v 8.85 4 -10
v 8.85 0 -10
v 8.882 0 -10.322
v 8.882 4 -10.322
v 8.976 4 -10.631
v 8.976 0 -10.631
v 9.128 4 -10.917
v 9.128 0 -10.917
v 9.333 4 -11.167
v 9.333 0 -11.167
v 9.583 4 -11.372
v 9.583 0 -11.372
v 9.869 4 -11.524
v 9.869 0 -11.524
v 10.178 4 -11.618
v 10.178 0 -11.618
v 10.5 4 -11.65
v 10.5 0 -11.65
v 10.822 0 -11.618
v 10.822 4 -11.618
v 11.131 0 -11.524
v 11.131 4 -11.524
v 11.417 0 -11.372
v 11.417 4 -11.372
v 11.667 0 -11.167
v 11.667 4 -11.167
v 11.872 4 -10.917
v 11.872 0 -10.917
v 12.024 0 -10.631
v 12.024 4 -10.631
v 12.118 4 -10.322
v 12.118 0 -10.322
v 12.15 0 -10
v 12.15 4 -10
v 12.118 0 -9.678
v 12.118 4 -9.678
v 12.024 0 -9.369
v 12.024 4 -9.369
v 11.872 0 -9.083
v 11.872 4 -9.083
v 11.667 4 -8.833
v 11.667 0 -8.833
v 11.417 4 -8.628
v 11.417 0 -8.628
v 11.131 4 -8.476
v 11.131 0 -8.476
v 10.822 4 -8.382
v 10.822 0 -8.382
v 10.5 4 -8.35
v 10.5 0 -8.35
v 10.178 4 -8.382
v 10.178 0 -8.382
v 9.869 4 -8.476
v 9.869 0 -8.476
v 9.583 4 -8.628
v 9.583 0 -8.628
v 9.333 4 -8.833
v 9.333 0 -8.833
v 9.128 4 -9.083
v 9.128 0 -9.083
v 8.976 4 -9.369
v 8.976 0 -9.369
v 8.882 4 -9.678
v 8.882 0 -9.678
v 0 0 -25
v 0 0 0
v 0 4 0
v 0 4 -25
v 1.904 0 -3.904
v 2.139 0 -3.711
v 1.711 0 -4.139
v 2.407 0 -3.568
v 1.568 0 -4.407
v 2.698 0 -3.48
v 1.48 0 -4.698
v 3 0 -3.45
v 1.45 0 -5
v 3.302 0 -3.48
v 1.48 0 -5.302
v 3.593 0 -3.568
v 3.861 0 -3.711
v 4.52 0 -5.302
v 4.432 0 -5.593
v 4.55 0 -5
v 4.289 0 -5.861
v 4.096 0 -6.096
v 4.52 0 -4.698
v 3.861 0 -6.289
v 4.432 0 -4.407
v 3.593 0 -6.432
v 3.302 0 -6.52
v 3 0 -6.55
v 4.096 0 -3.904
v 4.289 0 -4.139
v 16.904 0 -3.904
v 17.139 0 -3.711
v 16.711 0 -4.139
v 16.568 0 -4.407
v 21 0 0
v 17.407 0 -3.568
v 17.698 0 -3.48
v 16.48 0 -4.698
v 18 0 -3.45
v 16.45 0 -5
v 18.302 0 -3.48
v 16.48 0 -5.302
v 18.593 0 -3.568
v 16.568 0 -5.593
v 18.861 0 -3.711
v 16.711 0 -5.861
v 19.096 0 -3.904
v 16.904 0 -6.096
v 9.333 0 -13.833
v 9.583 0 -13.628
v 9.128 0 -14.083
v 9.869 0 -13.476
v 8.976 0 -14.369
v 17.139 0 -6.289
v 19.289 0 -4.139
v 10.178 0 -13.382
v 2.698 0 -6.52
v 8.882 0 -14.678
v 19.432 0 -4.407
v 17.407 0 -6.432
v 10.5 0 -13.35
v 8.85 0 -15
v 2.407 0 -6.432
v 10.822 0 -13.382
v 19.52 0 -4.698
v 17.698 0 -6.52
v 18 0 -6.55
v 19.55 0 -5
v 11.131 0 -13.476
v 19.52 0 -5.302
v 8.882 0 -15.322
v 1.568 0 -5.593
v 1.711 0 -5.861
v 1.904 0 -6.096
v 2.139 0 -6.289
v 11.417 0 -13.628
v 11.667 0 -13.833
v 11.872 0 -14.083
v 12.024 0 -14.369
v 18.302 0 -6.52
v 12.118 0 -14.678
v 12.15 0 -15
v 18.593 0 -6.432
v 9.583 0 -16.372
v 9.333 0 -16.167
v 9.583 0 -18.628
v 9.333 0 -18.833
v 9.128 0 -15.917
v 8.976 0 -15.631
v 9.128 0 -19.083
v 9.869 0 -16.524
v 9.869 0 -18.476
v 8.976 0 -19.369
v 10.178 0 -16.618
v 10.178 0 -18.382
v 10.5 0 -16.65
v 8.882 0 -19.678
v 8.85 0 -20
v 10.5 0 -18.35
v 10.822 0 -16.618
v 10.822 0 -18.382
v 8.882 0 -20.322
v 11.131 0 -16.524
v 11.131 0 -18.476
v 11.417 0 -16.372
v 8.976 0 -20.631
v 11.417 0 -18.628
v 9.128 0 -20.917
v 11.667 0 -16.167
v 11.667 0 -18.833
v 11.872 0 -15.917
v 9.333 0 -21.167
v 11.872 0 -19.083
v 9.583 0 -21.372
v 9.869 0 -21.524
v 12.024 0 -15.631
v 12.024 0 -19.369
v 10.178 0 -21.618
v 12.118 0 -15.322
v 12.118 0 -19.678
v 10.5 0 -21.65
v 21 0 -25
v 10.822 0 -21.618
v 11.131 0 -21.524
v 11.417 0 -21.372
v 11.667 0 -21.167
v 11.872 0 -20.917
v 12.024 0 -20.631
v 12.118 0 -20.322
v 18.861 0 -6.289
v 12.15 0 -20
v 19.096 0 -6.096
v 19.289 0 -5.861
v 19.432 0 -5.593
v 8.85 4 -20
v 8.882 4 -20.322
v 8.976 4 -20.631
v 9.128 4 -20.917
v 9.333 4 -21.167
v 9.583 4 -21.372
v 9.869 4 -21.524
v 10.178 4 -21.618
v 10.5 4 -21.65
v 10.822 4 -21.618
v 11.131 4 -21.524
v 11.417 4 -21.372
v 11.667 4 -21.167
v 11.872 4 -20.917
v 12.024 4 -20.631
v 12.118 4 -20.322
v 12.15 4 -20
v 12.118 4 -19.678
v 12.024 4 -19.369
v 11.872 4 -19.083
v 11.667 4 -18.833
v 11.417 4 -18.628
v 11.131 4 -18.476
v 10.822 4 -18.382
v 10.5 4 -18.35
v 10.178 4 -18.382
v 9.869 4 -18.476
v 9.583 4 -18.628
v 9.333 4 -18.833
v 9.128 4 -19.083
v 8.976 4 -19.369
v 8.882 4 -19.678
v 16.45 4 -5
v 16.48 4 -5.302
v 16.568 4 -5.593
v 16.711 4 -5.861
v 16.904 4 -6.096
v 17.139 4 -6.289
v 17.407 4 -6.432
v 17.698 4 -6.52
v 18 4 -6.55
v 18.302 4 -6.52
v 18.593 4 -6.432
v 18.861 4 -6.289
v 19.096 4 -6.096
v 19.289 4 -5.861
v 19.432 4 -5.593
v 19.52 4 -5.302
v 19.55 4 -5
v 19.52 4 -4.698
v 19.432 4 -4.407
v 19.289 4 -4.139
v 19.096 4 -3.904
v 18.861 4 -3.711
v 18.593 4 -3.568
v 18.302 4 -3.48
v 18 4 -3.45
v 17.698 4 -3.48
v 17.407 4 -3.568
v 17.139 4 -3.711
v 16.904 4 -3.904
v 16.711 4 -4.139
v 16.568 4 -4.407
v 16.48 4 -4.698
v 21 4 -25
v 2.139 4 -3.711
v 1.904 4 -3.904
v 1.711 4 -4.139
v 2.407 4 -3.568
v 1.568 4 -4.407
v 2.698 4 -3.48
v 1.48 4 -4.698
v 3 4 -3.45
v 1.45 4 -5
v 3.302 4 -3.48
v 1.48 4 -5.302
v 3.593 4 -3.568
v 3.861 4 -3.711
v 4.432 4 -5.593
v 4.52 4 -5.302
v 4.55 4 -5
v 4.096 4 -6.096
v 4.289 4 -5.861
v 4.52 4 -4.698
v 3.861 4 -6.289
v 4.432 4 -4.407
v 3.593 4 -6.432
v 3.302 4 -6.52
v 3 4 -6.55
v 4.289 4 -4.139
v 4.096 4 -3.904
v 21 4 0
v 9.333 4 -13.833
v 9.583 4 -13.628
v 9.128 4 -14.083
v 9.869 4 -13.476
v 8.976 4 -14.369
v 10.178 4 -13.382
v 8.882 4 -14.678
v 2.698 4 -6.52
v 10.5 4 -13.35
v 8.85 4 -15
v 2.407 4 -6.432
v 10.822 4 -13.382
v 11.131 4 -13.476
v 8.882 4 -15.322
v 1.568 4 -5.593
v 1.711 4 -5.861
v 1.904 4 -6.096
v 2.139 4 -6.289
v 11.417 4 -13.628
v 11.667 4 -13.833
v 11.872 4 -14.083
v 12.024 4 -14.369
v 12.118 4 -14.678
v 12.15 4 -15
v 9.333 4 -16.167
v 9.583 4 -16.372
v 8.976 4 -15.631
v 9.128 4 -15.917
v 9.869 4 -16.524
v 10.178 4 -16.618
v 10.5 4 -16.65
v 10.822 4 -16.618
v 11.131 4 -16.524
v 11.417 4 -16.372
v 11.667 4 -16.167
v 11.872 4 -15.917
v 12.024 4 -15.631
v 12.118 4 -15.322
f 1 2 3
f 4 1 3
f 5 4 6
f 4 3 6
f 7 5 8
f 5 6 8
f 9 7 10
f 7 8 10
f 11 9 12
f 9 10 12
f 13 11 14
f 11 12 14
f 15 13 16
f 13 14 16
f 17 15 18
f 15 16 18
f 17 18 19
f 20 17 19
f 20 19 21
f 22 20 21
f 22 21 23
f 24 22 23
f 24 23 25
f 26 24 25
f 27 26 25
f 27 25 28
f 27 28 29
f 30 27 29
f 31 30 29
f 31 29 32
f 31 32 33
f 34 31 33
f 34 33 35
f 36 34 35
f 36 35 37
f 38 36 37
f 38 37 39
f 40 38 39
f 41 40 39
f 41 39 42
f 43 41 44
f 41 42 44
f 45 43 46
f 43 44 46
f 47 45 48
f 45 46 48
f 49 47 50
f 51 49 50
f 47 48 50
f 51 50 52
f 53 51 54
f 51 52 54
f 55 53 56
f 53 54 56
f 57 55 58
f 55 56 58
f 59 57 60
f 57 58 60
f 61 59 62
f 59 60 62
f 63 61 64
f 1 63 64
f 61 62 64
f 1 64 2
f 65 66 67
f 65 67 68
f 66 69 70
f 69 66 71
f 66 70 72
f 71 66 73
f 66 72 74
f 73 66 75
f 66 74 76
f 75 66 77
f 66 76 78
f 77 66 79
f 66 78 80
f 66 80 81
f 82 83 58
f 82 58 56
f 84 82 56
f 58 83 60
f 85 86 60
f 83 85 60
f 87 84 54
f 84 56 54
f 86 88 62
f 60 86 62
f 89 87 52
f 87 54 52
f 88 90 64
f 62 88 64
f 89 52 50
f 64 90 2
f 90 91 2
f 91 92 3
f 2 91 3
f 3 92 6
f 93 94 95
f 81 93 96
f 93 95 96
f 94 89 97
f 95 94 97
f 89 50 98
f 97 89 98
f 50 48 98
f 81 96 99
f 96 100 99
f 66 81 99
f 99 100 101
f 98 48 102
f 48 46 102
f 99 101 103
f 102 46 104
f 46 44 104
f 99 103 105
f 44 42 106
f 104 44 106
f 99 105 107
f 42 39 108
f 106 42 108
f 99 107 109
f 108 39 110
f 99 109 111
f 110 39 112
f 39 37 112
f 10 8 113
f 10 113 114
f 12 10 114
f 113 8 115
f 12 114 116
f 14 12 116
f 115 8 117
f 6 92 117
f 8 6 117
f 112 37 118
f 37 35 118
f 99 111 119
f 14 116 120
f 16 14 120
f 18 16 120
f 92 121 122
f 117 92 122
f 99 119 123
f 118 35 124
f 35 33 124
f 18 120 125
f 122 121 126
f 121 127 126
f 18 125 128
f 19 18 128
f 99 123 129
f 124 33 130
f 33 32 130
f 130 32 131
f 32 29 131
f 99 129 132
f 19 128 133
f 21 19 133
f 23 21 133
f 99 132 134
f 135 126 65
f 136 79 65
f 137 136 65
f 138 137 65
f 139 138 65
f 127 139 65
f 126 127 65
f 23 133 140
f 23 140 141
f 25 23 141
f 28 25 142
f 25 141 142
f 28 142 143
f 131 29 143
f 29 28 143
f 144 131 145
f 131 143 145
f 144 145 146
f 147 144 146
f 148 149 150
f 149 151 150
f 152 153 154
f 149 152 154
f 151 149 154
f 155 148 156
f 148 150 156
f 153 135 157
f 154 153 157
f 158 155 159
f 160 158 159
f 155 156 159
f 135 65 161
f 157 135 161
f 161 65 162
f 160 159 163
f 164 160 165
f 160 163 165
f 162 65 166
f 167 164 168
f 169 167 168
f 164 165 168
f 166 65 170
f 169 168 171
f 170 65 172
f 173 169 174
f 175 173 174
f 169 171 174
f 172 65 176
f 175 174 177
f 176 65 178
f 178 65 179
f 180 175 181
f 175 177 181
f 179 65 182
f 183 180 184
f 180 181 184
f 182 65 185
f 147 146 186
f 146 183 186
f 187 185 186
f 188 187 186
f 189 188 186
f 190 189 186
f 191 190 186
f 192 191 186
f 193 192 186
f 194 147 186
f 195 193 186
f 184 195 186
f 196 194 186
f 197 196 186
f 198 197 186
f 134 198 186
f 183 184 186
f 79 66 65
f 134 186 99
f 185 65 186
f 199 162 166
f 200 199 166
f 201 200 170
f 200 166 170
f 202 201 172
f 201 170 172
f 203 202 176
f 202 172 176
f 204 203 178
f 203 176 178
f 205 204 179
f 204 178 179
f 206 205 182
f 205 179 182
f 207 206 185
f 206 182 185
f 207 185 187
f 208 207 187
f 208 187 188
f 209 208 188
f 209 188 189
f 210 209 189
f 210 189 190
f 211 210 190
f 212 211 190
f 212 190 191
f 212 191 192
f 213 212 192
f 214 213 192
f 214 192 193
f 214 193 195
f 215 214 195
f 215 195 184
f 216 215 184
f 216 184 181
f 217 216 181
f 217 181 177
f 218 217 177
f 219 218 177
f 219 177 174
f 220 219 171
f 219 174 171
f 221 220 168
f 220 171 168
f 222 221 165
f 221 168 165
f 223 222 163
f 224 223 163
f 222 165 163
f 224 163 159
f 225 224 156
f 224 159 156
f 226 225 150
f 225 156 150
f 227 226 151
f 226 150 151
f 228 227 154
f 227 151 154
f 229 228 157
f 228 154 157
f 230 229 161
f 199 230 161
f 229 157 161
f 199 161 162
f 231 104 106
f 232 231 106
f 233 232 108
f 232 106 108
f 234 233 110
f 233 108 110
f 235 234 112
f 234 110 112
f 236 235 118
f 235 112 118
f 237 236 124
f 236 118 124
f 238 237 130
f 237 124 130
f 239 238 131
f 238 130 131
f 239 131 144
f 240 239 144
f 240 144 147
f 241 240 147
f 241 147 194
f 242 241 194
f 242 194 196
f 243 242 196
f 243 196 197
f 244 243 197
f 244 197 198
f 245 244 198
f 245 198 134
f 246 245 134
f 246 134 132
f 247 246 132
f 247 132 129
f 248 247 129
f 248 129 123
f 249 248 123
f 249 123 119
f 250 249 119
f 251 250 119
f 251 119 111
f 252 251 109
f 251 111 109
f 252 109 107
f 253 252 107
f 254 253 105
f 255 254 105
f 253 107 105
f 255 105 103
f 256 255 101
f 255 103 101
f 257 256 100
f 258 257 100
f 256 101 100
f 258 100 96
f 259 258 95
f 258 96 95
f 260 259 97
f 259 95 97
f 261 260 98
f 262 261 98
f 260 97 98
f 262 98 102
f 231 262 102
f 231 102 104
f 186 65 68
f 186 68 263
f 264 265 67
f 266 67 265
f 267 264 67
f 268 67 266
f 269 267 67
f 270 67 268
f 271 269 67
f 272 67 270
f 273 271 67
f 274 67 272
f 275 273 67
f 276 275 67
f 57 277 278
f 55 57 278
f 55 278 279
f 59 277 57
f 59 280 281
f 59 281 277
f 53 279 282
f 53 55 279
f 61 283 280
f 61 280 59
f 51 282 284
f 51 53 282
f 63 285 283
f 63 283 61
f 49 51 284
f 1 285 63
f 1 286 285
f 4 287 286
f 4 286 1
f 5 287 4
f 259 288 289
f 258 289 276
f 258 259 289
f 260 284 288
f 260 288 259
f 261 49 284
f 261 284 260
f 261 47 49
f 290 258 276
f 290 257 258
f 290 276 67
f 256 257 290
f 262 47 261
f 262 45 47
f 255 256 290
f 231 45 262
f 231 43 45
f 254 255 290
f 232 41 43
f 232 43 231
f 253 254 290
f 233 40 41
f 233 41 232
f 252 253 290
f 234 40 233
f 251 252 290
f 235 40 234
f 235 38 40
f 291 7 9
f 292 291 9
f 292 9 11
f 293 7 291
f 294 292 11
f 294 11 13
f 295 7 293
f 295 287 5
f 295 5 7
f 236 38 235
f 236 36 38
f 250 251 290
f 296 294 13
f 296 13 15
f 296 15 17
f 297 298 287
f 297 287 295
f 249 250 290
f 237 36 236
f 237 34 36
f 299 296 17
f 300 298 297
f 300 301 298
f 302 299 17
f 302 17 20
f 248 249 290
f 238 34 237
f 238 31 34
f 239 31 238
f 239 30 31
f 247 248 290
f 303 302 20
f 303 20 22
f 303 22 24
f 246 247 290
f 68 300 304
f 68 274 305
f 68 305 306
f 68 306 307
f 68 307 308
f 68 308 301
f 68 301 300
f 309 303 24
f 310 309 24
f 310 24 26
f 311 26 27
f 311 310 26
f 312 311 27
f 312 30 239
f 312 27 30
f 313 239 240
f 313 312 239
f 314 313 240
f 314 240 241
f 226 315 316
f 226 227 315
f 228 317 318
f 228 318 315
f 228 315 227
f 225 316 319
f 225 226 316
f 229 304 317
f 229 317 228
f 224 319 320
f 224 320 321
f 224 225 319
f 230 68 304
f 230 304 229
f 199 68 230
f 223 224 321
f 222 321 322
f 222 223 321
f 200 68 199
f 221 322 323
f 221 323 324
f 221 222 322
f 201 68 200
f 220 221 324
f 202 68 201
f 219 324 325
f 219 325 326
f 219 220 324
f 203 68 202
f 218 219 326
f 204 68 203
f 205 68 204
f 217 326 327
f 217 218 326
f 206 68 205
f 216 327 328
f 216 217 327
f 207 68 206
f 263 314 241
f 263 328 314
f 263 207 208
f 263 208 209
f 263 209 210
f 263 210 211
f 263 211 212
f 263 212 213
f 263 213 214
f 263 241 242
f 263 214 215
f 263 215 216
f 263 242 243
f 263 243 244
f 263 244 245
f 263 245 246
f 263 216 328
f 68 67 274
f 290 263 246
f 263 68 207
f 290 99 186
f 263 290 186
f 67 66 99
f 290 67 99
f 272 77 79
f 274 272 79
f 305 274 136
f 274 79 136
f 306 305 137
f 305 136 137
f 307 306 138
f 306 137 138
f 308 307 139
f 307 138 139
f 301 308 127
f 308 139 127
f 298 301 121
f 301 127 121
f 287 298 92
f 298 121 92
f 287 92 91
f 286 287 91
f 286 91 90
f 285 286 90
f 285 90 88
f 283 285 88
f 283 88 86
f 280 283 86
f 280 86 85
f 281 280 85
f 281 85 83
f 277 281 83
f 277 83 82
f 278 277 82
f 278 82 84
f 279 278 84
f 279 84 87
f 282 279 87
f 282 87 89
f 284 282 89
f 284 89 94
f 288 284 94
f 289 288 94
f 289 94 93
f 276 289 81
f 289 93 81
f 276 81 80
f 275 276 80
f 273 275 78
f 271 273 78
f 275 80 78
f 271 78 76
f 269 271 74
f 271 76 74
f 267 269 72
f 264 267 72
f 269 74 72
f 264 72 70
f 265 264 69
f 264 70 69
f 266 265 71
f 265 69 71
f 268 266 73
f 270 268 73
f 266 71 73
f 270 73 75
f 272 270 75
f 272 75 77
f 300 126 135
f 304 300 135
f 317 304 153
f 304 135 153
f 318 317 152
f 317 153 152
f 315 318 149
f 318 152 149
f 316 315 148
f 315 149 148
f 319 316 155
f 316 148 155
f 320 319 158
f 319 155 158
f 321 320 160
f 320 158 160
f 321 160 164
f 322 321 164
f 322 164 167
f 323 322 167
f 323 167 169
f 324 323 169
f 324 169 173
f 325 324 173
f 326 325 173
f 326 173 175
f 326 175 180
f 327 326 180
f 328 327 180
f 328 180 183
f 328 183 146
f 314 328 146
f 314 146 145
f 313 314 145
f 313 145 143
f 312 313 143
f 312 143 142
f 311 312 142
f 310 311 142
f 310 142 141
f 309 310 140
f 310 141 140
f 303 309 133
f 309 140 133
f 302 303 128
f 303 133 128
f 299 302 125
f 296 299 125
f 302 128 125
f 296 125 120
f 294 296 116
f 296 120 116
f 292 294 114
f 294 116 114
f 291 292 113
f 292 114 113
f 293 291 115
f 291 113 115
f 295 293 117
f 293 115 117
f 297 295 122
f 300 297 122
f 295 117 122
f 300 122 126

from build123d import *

# Parameters (mm, degrees)
SKETCH1_W                      = 21
SKETCH1_H                      = 25
BOSS_EXTRUDE1_DEPTH            = 4
F_3_1_3_1_DIAMETER_HOLE1_D     = 3.1
F_3_1_3_1_DIAMETER_HOLE1_DEPTH = 10
F_3_1_3_1_DIAMETER_HOLE1_TIP   = 0.931333959
M4X0_7_TAPPED_HOLE1_D          = 3.3


with BuildPart() as part:
    # Sketch1 → Boss-Extrude1 (new body)
    with BuildSketch(Plane(origin=(0, 0, 0), x_dir=(1, 0, 0), z_dir=(0, 1, 0))):
        with Locations((10.5, 12.5)):
            Rectangle(SKETCH1_W, SKETCH1_H)
    extrude(amount=BOSS_EXTRUDE1_DEPTH)

    # Ø3.1 (3.1) Diameter Hole1
    with Locations(Plane(origin=(0, 4, 0), x_dir=(1, 0, 0), z_dir=(0, 1, 0))):
        with Locations((3, 5), (18, 5)):
            Hole(F_3_1_3_1_DIAMETER_HOLE1_D / 2, depth=F_3_1_3_1_DIAMETER_HOLE1_DEPTH)
            with Locations((0, 0, -(F_3_1_3_1_DIAMETER_HOLE1_DEPTH + F_3_1_3_1_DIAMETER_HOLE1_TIP / 2))):  # 118° drill point
                Cone(0, F_3_1_3_1_DIAMETER_HOLE1_D / 2, F_3_1_3_1_DIAMETER_HOLE1_TIP, mode=Mode.SUBTRACT)

    # M4x0.7 Tapped Hole1 (through all)
    with Locations(Plane(origin=(0, 4, 0), x_dir=(1, 0, 0), z_dir=(0, 1, 0))):
        with Locations((10.5, 10), (10.5, 20), (10.5, 15)):
            Hole(M4X0_7_TAPPED_HOLE1_D / 2)


solid = part.part
